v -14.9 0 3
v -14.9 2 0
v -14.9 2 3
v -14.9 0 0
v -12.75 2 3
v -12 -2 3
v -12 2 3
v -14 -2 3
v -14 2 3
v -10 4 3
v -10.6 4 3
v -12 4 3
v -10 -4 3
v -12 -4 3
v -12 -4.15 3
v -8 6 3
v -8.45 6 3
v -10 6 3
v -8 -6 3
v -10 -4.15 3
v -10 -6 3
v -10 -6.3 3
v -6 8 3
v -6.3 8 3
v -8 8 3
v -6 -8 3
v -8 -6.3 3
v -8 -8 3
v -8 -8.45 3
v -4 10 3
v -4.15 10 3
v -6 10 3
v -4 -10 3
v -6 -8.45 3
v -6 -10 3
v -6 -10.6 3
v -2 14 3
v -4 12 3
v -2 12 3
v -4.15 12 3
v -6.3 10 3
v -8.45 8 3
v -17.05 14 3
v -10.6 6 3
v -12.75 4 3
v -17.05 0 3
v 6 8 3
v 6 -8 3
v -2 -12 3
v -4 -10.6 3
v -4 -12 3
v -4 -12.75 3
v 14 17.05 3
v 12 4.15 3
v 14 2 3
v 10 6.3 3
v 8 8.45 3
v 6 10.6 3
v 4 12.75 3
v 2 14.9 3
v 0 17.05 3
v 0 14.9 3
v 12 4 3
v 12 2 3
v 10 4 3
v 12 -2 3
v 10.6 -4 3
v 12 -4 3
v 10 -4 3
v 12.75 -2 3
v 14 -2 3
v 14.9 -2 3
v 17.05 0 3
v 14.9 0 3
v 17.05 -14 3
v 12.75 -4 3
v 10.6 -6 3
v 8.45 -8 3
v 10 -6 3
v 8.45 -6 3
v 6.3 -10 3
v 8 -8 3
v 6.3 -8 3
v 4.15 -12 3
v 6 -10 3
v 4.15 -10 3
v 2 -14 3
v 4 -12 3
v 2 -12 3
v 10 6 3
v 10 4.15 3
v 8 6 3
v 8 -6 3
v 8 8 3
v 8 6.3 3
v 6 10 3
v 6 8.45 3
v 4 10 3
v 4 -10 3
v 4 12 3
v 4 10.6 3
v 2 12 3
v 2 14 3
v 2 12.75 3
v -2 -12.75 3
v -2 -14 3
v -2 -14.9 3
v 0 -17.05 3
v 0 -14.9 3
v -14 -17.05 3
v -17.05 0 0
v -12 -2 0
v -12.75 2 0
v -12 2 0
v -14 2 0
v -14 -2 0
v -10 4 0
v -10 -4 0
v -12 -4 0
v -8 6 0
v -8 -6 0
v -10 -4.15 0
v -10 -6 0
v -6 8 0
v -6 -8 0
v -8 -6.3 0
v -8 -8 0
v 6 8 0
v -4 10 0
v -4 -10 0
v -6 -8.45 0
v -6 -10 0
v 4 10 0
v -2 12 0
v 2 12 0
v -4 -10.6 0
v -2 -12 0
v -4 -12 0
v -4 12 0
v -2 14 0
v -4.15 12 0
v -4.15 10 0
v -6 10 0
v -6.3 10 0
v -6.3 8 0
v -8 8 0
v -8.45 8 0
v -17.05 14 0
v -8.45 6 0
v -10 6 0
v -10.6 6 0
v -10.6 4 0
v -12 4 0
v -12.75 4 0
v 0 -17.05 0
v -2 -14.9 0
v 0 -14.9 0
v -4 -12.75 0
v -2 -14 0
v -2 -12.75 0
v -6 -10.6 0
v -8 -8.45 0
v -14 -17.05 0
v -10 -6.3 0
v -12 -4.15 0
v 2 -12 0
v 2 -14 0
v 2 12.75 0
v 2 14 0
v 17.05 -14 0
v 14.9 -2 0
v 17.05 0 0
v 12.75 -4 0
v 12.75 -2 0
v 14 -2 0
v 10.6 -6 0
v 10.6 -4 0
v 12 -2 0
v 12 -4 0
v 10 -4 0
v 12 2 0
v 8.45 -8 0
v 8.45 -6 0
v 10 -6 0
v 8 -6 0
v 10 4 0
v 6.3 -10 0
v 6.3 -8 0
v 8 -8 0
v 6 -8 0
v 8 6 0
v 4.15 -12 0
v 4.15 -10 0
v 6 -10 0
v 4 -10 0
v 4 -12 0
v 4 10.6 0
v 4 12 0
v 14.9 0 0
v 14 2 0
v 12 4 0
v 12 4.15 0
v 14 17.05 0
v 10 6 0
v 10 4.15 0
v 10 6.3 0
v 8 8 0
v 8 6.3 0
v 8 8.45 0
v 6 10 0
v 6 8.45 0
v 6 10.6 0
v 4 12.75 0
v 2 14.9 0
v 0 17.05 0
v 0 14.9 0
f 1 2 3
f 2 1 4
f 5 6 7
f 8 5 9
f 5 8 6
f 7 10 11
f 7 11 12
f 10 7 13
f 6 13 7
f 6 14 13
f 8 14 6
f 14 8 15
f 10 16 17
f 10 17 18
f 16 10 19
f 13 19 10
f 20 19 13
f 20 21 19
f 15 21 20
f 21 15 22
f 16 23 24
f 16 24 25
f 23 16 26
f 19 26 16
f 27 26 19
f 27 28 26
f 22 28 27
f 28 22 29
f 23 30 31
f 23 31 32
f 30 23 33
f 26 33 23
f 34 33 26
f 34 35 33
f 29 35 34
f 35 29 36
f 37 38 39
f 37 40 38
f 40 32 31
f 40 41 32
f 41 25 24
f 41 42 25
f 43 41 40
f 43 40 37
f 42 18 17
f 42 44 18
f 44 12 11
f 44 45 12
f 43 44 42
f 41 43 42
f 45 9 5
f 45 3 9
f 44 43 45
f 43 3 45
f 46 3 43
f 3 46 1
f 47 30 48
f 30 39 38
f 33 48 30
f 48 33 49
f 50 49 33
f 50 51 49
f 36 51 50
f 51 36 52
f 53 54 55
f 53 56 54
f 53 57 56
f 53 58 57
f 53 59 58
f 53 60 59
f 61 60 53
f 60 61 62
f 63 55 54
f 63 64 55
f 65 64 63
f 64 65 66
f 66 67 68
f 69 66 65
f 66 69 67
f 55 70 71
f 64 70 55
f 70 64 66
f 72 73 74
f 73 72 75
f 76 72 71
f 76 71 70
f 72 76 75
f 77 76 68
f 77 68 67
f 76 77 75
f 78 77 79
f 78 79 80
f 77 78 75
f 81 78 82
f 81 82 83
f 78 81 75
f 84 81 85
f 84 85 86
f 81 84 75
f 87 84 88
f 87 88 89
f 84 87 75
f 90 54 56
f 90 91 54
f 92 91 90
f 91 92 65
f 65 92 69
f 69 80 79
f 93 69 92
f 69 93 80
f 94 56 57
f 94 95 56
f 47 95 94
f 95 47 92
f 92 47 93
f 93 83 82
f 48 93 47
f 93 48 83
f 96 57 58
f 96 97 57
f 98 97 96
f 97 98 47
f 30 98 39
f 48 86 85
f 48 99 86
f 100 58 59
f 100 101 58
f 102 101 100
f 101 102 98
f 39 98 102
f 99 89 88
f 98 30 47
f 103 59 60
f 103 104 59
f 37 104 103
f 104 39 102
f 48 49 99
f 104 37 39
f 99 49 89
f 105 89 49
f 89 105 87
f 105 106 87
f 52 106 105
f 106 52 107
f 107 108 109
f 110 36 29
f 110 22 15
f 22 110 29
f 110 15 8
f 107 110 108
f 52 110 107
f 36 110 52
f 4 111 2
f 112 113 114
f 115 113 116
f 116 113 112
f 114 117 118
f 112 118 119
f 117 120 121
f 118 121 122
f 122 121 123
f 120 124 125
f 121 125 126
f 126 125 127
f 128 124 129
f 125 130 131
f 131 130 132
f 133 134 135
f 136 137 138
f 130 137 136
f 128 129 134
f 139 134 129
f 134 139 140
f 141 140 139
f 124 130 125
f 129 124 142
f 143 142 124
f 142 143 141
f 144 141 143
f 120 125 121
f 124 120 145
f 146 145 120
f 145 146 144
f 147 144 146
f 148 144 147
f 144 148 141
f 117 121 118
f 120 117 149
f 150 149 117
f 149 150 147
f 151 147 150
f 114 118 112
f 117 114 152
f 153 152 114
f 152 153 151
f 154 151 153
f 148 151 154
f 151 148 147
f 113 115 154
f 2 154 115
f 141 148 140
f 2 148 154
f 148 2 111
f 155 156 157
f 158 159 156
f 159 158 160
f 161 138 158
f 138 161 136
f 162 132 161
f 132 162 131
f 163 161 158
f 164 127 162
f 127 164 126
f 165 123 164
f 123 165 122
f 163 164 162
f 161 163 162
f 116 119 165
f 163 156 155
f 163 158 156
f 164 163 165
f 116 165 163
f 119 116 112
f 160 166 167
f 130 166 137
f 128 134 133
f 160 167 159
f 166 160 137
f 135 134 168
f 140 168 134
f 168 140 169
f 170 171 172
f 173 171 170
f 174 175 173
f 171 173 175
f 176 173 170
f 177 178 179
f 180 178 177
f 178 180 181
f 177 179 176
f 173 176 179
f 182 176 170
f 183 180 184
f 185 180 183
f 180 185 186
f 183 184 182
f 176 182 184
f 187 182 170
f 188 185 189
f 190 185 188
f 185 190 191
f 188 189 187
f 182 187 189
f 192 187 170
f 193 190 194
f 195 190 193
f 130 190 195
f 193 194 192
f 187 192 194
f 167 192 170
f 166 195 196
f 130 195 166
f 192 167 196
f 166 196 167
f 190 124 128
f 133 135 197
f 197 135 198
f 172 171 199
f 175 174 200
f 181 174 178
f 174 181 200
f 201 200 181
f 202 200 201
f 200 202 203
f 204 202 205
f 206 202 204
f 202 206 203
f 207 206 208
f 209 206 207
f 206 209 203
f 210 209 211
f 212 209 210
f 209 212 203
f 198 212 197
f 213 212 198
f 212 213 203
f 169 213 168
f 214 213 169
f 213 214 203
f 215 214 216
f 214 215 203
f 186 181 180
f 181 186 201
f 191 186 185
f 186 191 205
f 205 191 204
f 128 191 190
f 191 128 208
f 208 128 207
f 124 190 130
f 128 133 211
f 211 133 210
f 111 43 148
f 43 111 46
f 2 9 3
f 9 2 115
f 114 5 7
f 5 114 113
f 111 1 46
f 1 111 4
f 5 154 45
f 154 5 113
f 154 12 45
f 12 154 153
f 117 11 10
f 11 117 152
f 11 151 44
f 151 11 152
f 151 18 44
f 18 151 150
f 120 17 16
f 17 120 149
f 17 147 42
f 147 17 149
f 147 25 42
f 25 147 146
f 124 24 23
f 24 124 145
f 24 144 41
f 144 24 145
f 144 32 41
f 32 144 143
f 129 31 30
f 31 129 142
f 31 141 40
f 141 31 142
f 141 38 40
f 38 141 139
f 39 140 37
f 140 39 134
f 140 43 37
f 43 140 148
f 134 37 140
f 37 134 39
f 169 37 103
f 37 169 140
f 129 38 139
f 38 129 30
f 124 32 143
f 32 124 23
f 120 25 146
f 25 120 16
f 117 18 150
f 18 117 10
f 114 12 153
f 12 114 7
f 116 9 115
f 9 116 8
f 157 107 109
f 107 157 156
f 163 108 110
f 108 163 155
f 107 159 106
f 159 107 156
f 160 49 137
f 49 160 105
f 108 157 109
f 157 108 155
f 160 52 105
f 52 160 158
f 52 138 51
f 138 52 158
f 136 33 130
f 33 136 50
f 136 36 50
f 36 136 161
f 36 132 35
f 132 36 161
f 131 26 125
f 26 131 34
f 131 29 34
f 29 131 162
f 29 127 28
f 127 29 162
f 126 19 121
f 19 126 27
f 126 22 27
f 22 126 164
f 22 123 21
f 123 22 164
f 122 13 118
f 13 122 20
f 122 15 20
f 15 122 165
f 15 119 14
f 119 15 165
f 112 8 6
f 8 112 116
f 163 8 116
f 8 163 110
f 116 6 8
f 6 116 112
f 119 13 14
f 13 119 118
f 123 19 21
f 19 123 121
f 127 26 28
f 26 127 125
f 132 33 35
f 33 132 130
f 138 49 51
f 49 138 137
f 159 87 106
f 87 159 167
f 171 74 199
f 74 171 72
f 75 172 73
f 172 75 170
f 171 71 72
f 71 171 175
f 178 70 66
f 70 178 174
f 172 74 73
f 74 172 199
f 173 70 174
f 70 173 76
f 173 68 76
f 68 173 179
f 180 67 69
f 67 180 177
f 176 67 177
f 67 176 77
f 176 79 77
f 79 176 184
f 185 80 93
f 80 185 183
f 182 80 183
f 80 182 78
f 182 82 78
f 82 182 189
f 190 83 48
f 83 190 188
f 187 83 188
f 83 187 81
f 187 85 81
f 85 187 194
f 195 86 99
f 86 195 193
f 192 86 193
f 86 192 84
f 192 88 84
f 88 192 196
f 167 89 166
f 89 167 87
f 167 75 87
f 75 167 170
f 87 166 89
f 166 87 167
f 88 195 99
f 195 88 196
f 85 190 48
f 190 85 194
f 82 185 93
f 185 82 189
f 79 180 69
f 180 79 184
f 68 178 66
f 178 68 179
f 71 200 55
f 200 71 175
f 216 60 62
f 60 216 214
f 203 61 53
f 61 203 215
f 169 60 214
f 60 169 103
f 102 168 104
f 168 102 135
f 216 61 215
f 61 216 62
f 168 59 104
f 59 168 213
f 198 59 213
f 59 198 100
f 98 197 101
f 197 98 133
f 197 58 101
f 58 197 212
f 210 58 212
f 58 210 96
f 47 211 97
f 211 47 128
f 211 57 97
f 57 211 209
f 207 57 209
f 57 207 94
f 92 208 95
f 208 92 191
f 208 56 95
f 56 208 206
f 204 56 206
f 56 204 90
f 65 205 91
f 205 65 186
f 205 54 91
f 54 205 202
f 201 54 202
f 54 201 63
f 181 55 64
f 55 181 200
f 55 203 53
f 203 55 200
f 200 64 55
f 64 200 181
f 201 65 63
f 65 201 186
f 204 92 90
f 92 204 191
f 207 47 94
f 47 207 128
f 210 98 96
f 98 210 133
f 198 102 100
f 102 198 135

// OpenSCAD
steps = 7;
stepsize = 2;
gapdelta = 0.15;
height = 3;

union() {
    for (a = [0:3]) {
        rotate([0,0,90*a]) {
            translate([-(steps+1)*(stepsize+gapdelta)+gapdelta,-stepsize,0]) {
               
                color("Gray", 1) {
                    union() {
                        for (dx = [1:steps]) {
                            translate([0,dx*stepsize,0]) {
                                cube([dx*(stepsize+gapdelta),stepsize,height]);
                            }
                        }
                    }
                    
                }
               
            }
            translate([0,-stepsize,0]) {

                color("Red", 1) {
                    union() {
                        for (dx = [1:steps]) {
                            translate([-dx*stepsize,stepsize*steps-(dx-1)*stepsize,0]) {
                                cube([dx*stepsize,stepsize,height]);
                            }
                        }
                    }
                }

            }
        }
    }
}
